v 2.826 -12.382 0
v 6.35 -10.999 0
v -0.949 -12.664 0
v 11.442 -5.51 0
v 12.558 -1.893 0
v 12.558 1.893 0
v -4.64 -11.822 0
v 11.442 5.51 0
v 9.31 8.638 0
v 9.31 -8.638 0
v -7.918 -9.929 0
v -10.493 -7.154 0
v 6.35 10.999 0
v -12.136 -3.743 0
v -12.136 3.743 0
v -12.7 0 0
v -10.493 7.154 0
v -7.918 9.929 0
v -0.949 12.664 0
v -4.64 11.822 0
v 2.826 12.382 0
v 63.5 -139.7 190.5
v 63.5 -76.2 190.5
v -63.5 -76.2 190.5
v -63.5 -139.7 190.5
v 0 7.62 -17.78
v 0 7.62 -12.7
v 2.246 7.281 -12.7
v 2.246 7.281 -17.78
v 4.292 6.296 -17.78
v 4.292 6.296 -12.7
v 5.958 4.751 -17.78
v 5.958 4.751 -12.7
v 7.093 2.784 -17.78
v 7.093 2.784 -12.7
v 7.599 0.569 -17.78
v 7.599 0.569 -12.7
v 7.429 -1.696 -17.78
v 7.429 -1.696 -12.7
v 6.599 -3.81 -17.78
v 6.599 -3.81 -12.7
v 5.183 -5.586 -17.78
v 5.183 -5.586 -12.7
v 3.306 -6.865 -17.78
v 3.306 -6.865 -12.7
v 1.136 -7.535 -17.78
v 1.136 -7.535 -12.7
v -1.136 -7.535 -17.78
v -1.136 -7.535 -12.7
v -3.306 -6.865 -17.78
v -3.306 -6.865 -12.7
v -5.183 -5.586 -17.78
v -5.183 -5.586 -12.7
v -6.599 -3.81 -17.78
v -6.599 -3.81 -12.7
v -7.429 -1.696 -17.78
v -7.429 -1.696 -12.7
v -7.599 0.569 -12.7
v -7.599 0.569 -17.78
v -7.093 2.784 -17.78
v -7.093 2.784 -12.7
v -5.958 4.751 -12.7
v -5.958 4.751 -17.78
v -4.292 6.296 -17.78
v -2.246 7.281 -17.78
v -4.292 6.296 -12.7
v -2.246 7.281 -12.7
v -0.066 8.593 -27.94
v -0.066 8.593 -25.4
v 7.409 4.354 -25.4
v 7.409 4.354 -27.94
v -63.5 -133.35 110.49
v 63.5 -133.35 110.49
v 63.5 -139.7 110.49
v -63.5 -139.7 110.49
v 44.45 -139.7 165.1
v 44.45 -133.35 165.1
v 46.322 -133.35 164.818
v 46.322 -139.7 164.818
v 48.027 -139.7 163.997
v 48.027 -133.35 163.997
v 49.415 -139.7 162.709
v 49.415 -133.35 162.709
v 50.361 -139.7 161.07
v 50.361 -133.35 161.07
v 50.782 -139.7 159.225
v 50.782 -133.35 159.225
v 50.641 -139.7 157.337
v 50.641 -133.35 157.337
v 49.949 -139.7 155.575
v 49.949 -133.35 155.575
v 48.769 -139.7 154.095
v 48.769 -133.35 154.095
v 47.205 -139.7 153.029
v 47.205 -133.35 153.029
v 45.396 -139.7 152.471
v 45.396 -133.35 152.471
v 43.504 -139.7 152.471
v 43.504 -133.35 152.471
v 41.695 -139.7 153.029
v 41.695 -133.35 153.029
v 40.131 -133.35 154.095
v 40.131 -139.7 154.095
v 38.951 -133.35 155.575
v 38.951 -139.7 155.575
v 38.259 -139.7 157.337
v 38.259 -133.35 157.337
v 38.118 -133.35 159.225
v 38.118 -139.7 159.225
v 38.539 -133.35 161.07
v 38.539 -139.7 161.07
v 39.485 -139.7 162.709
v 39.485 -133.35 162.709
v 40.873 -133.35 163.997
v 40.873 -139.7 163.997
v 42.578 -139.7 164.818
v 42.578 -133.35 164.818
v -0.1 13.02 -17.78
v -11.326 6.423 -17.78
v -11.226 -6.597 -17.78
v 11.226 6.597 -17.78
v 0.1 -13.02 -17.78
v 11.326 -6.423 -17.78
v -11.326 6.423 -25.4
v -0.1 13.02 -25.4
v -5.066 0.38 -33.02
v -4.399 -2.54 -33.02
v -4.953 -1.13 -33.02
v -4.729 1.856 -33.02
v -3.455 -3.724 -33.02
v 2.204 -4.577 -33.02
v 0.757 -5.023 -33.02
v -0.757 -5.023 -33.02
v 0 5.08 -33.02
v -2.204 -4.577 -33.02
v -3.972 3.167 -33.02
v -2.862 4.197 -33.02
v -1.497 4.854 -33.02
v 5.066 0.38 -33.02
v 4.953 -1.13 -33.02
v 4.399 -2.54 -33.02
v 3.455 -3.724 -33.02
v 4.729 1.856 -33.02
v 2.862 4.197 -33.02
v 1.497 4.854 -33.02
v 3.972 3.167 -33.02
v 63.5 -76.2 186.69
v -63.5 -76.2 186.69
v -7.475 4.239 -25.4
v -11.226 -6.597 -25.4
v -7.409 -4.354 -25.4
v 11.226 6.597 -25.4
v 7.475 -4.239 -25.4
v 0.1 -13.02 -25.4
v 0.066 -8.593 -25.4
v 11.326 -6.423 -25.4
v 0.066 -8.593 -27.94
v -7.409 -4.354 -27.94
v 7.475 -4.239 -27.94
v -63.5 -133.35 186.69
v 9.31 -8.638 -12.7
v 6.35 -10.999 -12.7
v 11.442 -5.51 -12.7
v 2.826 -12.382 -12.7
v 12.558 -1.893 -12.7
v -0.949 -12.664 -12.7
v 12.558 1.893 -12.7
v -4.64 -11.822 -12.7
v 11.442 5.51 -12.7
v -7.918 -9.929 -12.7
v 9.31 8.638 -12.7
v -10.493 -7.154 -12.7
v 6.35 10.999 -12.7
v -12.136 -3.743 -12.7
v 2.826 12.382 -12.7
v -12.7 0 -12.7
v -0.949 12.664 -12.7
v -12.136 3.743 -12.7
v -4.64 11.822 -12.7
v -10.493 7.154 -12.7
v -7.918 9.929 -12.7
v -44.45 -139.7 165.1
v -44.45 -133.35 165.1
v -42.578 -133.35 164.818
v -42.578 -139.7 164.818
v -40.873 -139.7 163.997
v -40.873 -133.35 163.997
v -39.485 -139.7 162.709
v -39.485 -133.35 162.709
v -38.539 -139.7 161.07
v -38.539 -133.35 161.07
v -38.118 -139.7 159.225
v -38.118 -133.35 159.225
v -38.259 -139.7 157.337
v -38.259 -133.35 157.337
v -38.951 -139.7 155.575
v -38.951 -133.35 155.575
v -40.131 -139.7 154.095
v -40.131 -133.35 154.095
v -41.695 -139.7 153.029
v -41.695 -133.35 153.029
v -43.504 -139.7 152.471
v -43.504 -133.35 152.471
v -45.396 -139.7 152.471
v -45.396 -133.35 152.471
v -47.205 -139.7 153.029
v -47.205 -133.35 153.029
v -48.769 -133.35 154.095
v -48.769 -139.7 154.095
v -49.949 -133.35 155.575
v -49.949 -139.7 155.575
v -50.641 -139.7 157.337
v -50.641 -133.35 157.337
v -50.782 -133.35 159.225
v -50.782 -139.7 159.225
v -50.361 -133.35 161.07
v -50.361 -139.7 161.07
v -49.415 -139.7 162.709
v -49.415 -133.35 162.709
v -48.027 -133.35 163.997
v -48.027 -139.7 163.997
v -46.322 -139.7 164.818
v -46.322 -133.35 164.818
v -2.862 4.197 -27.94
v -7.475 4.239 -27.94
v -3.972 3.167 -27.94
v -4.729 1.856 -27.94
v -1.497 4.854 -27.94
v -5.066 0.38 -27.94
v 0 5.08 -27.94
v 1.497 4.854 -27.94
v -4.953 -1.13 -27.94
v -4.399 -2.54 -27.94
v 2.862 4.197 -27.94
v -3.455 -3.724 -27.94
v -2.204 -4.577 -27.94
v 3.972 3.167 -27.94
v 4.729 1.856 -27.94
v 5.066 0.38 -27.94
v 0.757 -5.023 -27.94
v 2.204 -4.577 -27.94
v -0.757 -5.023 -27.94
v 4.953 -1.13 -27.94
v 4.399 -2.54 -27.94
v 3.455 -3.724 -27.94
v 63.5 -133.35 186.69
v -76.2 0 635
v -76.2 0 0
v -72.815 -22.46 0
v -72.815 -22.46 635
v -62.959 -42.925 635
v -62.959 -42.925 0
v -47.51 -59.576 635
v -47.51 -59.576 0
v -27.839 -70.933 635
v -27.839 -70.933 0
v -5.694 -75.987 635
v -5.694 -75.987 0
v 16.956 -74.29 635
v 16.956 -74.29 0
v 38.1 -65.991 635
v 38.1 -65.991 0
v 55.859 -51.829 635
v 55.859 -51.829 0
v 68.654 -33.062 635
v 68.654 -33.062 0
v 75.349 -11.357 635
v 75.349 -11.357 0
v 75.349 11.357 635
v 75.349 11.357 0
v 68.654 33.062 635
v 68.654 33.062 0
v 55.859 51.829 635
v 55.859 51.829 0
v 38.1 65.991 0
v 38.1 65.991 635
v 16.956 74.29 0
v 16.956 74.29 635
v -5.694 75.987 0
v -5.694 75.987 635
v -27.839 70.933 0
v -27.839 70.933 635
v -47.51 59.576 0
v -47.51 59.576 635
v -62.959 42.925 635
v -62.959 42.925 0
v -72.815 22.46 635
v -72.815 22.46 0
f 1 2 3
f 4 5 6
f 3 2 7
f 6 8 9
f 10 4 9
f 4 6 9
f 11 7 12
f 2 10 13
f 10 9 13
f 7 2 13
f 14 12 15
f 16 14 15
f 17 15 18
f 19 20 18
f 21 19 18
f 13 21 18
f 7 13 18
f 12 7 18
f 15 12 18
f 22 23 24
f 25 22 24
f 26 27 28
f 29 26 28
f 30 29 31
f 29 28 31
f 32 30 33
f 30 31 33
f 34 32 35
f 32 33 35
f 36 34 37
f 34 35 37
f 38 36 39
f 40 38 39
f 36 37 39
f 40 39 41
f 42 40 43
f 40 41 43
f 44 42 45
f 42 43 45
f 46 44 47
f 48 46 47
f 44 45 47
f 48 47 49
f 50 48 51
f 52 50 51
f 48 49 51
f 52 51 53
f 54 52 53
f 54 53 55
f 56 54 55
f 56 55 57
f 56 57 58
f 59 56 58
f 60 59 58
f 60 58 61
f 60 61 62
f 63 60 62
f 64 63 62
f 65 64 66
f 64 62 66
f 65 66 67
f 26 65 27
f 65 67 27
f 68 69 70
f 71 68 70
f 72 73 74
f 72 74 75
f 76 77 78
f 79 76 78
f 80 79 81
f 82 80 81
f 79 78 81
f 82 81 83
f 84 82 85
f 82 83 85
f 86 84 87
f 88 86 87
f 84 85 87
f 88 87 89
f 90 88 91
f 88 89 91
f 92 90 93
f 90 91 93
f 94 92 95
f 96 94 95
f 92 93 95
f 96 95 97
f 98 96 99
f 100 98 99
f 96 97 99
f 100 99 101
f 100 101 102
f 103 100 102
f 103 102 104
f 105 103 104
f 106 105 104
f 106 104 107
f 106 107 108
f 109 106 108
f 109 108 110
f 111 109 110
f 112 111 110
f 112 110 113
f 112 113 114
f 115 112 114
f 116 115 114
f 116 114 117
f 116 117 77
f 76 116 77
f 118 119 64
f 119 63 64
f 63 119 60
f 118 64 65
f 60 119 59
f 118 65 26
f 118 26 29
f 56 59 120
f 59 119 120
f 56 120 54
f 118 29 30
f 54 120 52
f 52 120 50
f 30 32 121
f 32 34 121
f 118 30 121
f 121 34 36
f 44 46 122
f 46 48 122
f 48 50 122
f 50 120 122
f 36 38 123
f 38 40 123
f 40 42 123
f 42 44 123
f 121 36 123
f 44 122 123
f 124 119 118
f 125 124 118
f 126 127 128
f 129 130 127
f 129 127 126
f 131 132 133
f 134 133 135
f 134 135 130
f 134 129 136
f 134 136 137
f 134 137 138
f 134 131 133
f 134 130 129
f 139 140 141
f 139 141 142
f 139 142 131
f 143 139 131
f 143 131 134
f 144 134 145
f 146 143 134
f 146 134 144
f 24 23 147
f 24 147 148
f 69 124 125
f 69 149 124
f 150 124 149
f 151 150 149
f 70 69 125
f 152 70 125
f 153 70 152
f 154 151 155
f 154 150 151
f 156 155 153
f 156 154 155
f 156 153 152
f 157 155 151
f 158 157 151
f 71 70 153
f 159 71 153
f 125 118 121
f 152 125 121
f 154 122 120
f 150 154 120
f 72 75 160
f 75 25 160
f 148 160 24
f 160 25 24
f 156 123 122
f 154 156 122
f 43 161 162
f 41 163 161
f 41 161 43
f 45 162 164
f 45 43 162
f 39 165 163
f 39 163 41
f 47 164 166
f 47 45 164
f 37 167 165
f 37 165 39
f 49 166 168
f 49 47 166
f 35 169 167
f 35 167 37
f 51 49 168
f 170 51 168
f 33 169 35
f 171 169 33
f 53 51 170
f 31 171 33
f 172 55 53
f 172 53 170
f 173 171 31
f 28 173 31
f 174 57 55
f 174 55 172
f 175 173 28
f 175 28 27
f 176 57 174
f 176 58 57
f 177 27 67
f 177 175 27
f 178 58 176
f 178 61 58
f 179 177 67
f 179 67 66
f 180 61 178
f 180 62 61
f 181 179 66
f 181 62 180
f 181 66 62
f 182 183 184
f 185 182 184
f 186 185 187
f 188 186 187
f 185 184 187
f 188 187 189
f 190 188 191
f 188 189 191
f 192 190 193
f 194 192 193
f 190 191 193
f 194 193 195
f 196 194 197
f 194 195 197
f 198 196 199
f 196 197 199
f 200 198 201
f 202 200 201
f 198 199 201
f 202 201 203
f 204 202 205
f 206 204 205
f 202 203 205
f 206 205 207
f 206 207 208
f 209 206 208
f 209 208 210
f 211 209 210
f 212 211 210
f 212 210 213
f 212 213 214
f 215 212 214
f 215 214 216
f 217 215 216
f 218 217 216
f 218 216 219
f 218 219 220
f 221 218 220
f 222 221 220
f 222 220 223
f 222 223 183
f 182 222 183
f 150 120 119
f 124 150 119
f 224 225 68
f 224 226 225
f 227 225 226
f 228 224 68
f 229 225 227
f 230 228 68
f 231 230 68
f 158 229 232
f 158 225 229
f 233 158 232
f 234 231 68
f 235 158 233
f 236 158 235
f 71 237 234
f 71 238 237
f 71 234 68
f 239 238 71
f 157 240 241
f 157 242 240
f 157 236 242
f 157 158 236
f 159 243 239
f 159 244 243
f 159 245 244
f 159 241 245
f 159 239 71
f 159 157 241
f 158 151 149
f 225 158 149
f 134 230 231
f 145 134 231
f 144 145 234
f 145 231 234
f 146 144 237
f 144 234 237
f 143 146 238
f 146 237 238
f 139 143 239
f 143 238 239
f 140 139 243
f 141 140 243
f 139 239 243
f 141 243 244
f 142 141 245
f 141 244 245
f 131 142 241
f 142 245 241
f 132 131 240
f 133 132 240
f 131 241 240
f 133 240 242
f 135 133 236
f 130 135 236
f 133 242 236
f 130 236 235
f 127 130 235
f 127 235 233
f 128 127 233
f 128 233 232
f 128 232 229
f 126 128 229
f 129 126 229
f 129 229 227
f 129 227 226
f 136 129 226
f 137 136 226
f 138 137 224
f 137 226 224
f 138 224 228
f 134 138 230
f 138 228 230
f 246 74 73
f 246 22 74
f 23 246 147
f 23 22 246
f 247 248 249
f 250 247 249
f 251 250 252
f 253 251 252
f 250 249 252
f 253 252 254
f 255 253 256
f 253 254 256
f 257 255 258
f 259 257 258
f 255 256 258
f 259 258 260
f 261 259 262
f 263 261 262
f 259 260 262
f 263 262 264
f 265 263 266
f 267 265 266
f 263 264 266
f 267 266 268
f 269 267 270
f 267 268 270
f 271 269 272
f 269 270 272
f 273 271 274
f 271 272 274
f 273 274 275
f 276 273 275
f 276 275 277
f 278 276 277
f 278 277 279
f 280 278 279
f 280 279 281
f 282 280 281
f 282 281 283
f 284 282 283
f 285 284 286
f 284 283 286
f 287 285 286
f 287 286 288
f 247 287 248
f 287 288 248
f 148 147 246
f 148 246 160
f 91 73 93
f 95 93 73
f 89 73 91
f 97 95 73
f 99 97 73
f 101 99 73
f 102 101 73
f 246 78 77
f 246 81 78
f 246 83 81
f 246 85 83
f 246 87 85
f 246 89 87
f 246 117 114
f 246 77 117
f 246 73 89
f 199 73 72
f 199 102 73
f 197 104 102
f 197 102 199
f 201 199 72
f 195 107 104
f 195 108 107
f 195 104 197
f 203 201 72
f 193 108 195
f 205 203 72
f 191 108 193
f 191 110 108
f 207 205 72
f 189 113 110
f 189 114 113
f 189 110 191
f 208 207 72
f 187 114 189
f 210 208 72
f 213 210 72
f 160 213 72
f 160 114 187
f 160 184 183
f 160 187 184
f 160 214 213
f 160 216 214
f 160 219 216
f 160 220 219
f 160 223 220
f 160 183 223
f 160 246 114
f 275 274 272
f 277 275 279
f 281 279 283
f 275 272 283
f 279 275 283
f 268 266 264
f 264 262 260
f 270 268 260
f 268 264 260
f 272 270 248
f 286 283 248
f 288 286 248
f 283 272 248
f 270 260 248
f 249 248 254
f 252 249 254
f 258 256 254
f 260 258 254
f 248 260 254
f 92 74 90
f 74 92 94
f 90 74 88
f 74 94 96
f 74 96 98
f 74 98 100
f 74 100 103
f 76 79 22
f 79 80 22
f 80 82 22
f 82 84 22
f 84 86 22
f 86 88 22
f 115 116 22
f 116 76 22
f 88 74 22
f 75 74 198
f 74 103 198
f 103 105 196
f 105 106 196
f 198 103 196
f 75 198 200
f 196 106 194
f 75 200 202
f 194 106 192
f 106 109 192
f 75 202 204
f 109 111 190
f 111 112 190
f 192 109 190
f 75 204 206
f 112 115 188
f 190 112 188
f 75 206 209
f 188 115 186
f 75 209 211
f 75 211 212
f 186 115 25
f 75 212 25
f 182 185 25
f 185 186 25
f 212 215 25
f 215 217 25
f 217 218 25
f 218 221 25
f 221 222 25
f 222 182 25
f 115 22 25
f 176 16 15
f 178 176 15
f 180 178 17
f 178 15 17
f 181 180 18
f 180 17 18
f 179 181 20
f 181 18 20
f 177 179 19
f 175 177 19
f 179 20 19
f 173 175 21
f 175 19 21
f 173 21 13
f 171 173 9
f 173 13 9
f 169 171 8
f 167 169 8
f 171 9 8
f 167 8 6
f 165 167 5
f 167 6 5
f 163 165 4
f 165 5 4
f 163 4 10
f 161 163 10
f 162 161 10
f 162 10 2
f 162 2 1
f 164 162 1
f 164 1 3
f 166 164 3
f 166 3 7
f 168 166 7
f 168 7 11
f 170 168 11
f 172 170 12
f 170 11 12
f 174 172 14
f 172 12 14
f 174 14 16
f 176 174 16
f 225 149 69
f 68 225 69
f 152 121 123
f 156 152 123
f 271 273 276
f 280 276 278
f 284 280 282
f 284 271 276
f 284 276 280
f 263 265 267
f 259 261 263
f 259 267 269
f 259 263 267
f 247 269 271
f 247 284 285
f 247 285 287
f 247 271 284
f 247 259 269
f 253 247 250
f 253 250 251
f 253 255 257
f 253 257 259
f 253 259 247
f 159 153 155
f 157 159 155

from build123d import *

# Parameters (mm, degrees)
SKETCH1_R           = 76.2
BOSS_EXTRUDE2_DEPTH = 635
SKETCH8_R           = 12.7
BOSS_EXTRUDE3_DEPTH = 12.7
SKETCH9_R           = 7.62
BOSS_EXTRUDE4_DEPTH = 5.08
BOSS_EXTRUDE5_DEPTH = 7.62
BOSS_EXTRUDE6_DEPTH = 2.54
SKETCH12_R          = 5.08
BOSS_EXTRUDE7_DEPTH = 5.08
SKETCH14_W          = 127
SKETCH14_H          = 63.5
BOSS_EXTRUDE8_DEPTH = 3.81
SKETCH15_W          = 127
SKETCH15_H          = 6.35
BOSS_EXTRUDE9_DEPTH = 76.2
SKETCH16_R          = 6.35
CUT_EXTRUDE1_DEPTH  = 674.010135511


with BuildPart() as part:
    # Sketch1 → Boss-Extrude2 (new body)
    with BuildSketch(Plane.XY):
        with Locations(Location((0, 0, 0), (0, 0, 180))):
            Circle(SKETCH1_R)
    extrude(amount=BOSS_EXTRUDE2_DEPTH)


with BuildPart() as body_2:
    # Sketch8 → Boss-Extrude3 (new body)
    with BuildSketch(Plane(origin=(0, 0, 0), x_dir=(-1, 0, 0), z_dir=(0, 0, -1))):
        Circle(SKETCH8_R)
    extrude(amount=BOSS_EXTRUDE3_DEPTH)

    # Sketch9 → Boss-Extrude4 (add)
    with BuildSketch(Plane(origin=(0, 0, -12.7), x_dir=(1, 0, 0), z_dir=(0, 0, -1))):
        with Locations(Location((0, 0, 0), (0, 0, 270))):
            Circle(SKETCH9_R)
    extrude(amount=BOSS_EXTRUDE4_DEPTH)

    # Sketch10 → Boss-Extrude5 (add)
    with BuildSketch(Plane(origin=(0, 0, -17.78), x_dir=(1, 0, 0), z_dir=(0, 0, -1))):
        Polygon((0.10018358, 13.020093655), (-11.225640075, 6.596808353), (-11.325823655, -6.423285302), (-0.10018358, -13.020093655), (11.225640075, -6.596808353), (11.325823655, 6.423285302), align=None)
    extrude(amount=BOSS_EXTRUDE5_DEPTH)

    # Sketch11 → Boss-Extrude6 (add)
    with BuildSketch(Plane(origin=(0, 0, -25.4), x_dir=(1, 0, 0), z_dir=(0, 0, -1))):
        Polygon((-7.408868452, 4.353861781), (-7.474989133, -4.239337402), (-0.066120681, -8.593199183), (7.408868452, -4.353861781), (7.474989133, 4.239337402), (0.066120681, 8.593199183), align=None)
    extrude(amount=BOSS_EXTRUDE6_DEPTH)

    # Sketch12 → Boss-Extrude7 (add)
    with BuildSketch(Plane(origin=(0, 0, -27.94), x_dir=(1, 0, 0), z_dir=(0, 0, -1))):
        with Locations(Location((0, 0, 0), (0, 0, 270))):
            Circle(SKETCH12_R)
    extrude(amount=BOSS_EXTRUDE7_DEPTH)


with BuildPart() as body_3:
    # Sketch14 → Boss-Extrude8 (new body)
    with BuildSketch(Plane(origin=(0, 0, 190.5), x_dir=(-1, 0, 0), z_dir=(0, 0, -1))):
        with Locations((0, -107.95)):
            Rectangle(SKETCH14_W, SKETCH14_H)
    extrude(amount=BOSS_EXTRUDE8_DEPTH)

    # Sketch15 → Boss-Extrude9 (add)
    with BuildSketch(Plane(origin=(0, 0, 186.69), x_dir=(-1, 0, 0), z_dir=(0, 0, -1))):
        with Locations((0, -136.525)):
            Rectangle(SKETCH15_W, SKETCH15_H)
    extrude(amount=BOSS_EXTRUDE9_DEPTH)

    # Sketch16 → Cut-Extrude1 (cut, through all)
    with BuildSketch(Plane(origin=(0, -133.35, 0), x_dir=(1, 0, 0), z_dir=(0, 1, 0))):
        with Locations(Location((44.45, -158.75, 0), (0, 0, 270))):
            Circle(SKETCH16_R)
        with Locations(Location((-44.45, -158.75, 0), (0, 0, 270))):
            Circle(SKETCH16_R)
    extrude(amount=-CUT_EXTRUDE1_DEPTH, mode=Mode.SUBTRACT)


solid = Compound([part.part, body_2.part, body_3.part])
